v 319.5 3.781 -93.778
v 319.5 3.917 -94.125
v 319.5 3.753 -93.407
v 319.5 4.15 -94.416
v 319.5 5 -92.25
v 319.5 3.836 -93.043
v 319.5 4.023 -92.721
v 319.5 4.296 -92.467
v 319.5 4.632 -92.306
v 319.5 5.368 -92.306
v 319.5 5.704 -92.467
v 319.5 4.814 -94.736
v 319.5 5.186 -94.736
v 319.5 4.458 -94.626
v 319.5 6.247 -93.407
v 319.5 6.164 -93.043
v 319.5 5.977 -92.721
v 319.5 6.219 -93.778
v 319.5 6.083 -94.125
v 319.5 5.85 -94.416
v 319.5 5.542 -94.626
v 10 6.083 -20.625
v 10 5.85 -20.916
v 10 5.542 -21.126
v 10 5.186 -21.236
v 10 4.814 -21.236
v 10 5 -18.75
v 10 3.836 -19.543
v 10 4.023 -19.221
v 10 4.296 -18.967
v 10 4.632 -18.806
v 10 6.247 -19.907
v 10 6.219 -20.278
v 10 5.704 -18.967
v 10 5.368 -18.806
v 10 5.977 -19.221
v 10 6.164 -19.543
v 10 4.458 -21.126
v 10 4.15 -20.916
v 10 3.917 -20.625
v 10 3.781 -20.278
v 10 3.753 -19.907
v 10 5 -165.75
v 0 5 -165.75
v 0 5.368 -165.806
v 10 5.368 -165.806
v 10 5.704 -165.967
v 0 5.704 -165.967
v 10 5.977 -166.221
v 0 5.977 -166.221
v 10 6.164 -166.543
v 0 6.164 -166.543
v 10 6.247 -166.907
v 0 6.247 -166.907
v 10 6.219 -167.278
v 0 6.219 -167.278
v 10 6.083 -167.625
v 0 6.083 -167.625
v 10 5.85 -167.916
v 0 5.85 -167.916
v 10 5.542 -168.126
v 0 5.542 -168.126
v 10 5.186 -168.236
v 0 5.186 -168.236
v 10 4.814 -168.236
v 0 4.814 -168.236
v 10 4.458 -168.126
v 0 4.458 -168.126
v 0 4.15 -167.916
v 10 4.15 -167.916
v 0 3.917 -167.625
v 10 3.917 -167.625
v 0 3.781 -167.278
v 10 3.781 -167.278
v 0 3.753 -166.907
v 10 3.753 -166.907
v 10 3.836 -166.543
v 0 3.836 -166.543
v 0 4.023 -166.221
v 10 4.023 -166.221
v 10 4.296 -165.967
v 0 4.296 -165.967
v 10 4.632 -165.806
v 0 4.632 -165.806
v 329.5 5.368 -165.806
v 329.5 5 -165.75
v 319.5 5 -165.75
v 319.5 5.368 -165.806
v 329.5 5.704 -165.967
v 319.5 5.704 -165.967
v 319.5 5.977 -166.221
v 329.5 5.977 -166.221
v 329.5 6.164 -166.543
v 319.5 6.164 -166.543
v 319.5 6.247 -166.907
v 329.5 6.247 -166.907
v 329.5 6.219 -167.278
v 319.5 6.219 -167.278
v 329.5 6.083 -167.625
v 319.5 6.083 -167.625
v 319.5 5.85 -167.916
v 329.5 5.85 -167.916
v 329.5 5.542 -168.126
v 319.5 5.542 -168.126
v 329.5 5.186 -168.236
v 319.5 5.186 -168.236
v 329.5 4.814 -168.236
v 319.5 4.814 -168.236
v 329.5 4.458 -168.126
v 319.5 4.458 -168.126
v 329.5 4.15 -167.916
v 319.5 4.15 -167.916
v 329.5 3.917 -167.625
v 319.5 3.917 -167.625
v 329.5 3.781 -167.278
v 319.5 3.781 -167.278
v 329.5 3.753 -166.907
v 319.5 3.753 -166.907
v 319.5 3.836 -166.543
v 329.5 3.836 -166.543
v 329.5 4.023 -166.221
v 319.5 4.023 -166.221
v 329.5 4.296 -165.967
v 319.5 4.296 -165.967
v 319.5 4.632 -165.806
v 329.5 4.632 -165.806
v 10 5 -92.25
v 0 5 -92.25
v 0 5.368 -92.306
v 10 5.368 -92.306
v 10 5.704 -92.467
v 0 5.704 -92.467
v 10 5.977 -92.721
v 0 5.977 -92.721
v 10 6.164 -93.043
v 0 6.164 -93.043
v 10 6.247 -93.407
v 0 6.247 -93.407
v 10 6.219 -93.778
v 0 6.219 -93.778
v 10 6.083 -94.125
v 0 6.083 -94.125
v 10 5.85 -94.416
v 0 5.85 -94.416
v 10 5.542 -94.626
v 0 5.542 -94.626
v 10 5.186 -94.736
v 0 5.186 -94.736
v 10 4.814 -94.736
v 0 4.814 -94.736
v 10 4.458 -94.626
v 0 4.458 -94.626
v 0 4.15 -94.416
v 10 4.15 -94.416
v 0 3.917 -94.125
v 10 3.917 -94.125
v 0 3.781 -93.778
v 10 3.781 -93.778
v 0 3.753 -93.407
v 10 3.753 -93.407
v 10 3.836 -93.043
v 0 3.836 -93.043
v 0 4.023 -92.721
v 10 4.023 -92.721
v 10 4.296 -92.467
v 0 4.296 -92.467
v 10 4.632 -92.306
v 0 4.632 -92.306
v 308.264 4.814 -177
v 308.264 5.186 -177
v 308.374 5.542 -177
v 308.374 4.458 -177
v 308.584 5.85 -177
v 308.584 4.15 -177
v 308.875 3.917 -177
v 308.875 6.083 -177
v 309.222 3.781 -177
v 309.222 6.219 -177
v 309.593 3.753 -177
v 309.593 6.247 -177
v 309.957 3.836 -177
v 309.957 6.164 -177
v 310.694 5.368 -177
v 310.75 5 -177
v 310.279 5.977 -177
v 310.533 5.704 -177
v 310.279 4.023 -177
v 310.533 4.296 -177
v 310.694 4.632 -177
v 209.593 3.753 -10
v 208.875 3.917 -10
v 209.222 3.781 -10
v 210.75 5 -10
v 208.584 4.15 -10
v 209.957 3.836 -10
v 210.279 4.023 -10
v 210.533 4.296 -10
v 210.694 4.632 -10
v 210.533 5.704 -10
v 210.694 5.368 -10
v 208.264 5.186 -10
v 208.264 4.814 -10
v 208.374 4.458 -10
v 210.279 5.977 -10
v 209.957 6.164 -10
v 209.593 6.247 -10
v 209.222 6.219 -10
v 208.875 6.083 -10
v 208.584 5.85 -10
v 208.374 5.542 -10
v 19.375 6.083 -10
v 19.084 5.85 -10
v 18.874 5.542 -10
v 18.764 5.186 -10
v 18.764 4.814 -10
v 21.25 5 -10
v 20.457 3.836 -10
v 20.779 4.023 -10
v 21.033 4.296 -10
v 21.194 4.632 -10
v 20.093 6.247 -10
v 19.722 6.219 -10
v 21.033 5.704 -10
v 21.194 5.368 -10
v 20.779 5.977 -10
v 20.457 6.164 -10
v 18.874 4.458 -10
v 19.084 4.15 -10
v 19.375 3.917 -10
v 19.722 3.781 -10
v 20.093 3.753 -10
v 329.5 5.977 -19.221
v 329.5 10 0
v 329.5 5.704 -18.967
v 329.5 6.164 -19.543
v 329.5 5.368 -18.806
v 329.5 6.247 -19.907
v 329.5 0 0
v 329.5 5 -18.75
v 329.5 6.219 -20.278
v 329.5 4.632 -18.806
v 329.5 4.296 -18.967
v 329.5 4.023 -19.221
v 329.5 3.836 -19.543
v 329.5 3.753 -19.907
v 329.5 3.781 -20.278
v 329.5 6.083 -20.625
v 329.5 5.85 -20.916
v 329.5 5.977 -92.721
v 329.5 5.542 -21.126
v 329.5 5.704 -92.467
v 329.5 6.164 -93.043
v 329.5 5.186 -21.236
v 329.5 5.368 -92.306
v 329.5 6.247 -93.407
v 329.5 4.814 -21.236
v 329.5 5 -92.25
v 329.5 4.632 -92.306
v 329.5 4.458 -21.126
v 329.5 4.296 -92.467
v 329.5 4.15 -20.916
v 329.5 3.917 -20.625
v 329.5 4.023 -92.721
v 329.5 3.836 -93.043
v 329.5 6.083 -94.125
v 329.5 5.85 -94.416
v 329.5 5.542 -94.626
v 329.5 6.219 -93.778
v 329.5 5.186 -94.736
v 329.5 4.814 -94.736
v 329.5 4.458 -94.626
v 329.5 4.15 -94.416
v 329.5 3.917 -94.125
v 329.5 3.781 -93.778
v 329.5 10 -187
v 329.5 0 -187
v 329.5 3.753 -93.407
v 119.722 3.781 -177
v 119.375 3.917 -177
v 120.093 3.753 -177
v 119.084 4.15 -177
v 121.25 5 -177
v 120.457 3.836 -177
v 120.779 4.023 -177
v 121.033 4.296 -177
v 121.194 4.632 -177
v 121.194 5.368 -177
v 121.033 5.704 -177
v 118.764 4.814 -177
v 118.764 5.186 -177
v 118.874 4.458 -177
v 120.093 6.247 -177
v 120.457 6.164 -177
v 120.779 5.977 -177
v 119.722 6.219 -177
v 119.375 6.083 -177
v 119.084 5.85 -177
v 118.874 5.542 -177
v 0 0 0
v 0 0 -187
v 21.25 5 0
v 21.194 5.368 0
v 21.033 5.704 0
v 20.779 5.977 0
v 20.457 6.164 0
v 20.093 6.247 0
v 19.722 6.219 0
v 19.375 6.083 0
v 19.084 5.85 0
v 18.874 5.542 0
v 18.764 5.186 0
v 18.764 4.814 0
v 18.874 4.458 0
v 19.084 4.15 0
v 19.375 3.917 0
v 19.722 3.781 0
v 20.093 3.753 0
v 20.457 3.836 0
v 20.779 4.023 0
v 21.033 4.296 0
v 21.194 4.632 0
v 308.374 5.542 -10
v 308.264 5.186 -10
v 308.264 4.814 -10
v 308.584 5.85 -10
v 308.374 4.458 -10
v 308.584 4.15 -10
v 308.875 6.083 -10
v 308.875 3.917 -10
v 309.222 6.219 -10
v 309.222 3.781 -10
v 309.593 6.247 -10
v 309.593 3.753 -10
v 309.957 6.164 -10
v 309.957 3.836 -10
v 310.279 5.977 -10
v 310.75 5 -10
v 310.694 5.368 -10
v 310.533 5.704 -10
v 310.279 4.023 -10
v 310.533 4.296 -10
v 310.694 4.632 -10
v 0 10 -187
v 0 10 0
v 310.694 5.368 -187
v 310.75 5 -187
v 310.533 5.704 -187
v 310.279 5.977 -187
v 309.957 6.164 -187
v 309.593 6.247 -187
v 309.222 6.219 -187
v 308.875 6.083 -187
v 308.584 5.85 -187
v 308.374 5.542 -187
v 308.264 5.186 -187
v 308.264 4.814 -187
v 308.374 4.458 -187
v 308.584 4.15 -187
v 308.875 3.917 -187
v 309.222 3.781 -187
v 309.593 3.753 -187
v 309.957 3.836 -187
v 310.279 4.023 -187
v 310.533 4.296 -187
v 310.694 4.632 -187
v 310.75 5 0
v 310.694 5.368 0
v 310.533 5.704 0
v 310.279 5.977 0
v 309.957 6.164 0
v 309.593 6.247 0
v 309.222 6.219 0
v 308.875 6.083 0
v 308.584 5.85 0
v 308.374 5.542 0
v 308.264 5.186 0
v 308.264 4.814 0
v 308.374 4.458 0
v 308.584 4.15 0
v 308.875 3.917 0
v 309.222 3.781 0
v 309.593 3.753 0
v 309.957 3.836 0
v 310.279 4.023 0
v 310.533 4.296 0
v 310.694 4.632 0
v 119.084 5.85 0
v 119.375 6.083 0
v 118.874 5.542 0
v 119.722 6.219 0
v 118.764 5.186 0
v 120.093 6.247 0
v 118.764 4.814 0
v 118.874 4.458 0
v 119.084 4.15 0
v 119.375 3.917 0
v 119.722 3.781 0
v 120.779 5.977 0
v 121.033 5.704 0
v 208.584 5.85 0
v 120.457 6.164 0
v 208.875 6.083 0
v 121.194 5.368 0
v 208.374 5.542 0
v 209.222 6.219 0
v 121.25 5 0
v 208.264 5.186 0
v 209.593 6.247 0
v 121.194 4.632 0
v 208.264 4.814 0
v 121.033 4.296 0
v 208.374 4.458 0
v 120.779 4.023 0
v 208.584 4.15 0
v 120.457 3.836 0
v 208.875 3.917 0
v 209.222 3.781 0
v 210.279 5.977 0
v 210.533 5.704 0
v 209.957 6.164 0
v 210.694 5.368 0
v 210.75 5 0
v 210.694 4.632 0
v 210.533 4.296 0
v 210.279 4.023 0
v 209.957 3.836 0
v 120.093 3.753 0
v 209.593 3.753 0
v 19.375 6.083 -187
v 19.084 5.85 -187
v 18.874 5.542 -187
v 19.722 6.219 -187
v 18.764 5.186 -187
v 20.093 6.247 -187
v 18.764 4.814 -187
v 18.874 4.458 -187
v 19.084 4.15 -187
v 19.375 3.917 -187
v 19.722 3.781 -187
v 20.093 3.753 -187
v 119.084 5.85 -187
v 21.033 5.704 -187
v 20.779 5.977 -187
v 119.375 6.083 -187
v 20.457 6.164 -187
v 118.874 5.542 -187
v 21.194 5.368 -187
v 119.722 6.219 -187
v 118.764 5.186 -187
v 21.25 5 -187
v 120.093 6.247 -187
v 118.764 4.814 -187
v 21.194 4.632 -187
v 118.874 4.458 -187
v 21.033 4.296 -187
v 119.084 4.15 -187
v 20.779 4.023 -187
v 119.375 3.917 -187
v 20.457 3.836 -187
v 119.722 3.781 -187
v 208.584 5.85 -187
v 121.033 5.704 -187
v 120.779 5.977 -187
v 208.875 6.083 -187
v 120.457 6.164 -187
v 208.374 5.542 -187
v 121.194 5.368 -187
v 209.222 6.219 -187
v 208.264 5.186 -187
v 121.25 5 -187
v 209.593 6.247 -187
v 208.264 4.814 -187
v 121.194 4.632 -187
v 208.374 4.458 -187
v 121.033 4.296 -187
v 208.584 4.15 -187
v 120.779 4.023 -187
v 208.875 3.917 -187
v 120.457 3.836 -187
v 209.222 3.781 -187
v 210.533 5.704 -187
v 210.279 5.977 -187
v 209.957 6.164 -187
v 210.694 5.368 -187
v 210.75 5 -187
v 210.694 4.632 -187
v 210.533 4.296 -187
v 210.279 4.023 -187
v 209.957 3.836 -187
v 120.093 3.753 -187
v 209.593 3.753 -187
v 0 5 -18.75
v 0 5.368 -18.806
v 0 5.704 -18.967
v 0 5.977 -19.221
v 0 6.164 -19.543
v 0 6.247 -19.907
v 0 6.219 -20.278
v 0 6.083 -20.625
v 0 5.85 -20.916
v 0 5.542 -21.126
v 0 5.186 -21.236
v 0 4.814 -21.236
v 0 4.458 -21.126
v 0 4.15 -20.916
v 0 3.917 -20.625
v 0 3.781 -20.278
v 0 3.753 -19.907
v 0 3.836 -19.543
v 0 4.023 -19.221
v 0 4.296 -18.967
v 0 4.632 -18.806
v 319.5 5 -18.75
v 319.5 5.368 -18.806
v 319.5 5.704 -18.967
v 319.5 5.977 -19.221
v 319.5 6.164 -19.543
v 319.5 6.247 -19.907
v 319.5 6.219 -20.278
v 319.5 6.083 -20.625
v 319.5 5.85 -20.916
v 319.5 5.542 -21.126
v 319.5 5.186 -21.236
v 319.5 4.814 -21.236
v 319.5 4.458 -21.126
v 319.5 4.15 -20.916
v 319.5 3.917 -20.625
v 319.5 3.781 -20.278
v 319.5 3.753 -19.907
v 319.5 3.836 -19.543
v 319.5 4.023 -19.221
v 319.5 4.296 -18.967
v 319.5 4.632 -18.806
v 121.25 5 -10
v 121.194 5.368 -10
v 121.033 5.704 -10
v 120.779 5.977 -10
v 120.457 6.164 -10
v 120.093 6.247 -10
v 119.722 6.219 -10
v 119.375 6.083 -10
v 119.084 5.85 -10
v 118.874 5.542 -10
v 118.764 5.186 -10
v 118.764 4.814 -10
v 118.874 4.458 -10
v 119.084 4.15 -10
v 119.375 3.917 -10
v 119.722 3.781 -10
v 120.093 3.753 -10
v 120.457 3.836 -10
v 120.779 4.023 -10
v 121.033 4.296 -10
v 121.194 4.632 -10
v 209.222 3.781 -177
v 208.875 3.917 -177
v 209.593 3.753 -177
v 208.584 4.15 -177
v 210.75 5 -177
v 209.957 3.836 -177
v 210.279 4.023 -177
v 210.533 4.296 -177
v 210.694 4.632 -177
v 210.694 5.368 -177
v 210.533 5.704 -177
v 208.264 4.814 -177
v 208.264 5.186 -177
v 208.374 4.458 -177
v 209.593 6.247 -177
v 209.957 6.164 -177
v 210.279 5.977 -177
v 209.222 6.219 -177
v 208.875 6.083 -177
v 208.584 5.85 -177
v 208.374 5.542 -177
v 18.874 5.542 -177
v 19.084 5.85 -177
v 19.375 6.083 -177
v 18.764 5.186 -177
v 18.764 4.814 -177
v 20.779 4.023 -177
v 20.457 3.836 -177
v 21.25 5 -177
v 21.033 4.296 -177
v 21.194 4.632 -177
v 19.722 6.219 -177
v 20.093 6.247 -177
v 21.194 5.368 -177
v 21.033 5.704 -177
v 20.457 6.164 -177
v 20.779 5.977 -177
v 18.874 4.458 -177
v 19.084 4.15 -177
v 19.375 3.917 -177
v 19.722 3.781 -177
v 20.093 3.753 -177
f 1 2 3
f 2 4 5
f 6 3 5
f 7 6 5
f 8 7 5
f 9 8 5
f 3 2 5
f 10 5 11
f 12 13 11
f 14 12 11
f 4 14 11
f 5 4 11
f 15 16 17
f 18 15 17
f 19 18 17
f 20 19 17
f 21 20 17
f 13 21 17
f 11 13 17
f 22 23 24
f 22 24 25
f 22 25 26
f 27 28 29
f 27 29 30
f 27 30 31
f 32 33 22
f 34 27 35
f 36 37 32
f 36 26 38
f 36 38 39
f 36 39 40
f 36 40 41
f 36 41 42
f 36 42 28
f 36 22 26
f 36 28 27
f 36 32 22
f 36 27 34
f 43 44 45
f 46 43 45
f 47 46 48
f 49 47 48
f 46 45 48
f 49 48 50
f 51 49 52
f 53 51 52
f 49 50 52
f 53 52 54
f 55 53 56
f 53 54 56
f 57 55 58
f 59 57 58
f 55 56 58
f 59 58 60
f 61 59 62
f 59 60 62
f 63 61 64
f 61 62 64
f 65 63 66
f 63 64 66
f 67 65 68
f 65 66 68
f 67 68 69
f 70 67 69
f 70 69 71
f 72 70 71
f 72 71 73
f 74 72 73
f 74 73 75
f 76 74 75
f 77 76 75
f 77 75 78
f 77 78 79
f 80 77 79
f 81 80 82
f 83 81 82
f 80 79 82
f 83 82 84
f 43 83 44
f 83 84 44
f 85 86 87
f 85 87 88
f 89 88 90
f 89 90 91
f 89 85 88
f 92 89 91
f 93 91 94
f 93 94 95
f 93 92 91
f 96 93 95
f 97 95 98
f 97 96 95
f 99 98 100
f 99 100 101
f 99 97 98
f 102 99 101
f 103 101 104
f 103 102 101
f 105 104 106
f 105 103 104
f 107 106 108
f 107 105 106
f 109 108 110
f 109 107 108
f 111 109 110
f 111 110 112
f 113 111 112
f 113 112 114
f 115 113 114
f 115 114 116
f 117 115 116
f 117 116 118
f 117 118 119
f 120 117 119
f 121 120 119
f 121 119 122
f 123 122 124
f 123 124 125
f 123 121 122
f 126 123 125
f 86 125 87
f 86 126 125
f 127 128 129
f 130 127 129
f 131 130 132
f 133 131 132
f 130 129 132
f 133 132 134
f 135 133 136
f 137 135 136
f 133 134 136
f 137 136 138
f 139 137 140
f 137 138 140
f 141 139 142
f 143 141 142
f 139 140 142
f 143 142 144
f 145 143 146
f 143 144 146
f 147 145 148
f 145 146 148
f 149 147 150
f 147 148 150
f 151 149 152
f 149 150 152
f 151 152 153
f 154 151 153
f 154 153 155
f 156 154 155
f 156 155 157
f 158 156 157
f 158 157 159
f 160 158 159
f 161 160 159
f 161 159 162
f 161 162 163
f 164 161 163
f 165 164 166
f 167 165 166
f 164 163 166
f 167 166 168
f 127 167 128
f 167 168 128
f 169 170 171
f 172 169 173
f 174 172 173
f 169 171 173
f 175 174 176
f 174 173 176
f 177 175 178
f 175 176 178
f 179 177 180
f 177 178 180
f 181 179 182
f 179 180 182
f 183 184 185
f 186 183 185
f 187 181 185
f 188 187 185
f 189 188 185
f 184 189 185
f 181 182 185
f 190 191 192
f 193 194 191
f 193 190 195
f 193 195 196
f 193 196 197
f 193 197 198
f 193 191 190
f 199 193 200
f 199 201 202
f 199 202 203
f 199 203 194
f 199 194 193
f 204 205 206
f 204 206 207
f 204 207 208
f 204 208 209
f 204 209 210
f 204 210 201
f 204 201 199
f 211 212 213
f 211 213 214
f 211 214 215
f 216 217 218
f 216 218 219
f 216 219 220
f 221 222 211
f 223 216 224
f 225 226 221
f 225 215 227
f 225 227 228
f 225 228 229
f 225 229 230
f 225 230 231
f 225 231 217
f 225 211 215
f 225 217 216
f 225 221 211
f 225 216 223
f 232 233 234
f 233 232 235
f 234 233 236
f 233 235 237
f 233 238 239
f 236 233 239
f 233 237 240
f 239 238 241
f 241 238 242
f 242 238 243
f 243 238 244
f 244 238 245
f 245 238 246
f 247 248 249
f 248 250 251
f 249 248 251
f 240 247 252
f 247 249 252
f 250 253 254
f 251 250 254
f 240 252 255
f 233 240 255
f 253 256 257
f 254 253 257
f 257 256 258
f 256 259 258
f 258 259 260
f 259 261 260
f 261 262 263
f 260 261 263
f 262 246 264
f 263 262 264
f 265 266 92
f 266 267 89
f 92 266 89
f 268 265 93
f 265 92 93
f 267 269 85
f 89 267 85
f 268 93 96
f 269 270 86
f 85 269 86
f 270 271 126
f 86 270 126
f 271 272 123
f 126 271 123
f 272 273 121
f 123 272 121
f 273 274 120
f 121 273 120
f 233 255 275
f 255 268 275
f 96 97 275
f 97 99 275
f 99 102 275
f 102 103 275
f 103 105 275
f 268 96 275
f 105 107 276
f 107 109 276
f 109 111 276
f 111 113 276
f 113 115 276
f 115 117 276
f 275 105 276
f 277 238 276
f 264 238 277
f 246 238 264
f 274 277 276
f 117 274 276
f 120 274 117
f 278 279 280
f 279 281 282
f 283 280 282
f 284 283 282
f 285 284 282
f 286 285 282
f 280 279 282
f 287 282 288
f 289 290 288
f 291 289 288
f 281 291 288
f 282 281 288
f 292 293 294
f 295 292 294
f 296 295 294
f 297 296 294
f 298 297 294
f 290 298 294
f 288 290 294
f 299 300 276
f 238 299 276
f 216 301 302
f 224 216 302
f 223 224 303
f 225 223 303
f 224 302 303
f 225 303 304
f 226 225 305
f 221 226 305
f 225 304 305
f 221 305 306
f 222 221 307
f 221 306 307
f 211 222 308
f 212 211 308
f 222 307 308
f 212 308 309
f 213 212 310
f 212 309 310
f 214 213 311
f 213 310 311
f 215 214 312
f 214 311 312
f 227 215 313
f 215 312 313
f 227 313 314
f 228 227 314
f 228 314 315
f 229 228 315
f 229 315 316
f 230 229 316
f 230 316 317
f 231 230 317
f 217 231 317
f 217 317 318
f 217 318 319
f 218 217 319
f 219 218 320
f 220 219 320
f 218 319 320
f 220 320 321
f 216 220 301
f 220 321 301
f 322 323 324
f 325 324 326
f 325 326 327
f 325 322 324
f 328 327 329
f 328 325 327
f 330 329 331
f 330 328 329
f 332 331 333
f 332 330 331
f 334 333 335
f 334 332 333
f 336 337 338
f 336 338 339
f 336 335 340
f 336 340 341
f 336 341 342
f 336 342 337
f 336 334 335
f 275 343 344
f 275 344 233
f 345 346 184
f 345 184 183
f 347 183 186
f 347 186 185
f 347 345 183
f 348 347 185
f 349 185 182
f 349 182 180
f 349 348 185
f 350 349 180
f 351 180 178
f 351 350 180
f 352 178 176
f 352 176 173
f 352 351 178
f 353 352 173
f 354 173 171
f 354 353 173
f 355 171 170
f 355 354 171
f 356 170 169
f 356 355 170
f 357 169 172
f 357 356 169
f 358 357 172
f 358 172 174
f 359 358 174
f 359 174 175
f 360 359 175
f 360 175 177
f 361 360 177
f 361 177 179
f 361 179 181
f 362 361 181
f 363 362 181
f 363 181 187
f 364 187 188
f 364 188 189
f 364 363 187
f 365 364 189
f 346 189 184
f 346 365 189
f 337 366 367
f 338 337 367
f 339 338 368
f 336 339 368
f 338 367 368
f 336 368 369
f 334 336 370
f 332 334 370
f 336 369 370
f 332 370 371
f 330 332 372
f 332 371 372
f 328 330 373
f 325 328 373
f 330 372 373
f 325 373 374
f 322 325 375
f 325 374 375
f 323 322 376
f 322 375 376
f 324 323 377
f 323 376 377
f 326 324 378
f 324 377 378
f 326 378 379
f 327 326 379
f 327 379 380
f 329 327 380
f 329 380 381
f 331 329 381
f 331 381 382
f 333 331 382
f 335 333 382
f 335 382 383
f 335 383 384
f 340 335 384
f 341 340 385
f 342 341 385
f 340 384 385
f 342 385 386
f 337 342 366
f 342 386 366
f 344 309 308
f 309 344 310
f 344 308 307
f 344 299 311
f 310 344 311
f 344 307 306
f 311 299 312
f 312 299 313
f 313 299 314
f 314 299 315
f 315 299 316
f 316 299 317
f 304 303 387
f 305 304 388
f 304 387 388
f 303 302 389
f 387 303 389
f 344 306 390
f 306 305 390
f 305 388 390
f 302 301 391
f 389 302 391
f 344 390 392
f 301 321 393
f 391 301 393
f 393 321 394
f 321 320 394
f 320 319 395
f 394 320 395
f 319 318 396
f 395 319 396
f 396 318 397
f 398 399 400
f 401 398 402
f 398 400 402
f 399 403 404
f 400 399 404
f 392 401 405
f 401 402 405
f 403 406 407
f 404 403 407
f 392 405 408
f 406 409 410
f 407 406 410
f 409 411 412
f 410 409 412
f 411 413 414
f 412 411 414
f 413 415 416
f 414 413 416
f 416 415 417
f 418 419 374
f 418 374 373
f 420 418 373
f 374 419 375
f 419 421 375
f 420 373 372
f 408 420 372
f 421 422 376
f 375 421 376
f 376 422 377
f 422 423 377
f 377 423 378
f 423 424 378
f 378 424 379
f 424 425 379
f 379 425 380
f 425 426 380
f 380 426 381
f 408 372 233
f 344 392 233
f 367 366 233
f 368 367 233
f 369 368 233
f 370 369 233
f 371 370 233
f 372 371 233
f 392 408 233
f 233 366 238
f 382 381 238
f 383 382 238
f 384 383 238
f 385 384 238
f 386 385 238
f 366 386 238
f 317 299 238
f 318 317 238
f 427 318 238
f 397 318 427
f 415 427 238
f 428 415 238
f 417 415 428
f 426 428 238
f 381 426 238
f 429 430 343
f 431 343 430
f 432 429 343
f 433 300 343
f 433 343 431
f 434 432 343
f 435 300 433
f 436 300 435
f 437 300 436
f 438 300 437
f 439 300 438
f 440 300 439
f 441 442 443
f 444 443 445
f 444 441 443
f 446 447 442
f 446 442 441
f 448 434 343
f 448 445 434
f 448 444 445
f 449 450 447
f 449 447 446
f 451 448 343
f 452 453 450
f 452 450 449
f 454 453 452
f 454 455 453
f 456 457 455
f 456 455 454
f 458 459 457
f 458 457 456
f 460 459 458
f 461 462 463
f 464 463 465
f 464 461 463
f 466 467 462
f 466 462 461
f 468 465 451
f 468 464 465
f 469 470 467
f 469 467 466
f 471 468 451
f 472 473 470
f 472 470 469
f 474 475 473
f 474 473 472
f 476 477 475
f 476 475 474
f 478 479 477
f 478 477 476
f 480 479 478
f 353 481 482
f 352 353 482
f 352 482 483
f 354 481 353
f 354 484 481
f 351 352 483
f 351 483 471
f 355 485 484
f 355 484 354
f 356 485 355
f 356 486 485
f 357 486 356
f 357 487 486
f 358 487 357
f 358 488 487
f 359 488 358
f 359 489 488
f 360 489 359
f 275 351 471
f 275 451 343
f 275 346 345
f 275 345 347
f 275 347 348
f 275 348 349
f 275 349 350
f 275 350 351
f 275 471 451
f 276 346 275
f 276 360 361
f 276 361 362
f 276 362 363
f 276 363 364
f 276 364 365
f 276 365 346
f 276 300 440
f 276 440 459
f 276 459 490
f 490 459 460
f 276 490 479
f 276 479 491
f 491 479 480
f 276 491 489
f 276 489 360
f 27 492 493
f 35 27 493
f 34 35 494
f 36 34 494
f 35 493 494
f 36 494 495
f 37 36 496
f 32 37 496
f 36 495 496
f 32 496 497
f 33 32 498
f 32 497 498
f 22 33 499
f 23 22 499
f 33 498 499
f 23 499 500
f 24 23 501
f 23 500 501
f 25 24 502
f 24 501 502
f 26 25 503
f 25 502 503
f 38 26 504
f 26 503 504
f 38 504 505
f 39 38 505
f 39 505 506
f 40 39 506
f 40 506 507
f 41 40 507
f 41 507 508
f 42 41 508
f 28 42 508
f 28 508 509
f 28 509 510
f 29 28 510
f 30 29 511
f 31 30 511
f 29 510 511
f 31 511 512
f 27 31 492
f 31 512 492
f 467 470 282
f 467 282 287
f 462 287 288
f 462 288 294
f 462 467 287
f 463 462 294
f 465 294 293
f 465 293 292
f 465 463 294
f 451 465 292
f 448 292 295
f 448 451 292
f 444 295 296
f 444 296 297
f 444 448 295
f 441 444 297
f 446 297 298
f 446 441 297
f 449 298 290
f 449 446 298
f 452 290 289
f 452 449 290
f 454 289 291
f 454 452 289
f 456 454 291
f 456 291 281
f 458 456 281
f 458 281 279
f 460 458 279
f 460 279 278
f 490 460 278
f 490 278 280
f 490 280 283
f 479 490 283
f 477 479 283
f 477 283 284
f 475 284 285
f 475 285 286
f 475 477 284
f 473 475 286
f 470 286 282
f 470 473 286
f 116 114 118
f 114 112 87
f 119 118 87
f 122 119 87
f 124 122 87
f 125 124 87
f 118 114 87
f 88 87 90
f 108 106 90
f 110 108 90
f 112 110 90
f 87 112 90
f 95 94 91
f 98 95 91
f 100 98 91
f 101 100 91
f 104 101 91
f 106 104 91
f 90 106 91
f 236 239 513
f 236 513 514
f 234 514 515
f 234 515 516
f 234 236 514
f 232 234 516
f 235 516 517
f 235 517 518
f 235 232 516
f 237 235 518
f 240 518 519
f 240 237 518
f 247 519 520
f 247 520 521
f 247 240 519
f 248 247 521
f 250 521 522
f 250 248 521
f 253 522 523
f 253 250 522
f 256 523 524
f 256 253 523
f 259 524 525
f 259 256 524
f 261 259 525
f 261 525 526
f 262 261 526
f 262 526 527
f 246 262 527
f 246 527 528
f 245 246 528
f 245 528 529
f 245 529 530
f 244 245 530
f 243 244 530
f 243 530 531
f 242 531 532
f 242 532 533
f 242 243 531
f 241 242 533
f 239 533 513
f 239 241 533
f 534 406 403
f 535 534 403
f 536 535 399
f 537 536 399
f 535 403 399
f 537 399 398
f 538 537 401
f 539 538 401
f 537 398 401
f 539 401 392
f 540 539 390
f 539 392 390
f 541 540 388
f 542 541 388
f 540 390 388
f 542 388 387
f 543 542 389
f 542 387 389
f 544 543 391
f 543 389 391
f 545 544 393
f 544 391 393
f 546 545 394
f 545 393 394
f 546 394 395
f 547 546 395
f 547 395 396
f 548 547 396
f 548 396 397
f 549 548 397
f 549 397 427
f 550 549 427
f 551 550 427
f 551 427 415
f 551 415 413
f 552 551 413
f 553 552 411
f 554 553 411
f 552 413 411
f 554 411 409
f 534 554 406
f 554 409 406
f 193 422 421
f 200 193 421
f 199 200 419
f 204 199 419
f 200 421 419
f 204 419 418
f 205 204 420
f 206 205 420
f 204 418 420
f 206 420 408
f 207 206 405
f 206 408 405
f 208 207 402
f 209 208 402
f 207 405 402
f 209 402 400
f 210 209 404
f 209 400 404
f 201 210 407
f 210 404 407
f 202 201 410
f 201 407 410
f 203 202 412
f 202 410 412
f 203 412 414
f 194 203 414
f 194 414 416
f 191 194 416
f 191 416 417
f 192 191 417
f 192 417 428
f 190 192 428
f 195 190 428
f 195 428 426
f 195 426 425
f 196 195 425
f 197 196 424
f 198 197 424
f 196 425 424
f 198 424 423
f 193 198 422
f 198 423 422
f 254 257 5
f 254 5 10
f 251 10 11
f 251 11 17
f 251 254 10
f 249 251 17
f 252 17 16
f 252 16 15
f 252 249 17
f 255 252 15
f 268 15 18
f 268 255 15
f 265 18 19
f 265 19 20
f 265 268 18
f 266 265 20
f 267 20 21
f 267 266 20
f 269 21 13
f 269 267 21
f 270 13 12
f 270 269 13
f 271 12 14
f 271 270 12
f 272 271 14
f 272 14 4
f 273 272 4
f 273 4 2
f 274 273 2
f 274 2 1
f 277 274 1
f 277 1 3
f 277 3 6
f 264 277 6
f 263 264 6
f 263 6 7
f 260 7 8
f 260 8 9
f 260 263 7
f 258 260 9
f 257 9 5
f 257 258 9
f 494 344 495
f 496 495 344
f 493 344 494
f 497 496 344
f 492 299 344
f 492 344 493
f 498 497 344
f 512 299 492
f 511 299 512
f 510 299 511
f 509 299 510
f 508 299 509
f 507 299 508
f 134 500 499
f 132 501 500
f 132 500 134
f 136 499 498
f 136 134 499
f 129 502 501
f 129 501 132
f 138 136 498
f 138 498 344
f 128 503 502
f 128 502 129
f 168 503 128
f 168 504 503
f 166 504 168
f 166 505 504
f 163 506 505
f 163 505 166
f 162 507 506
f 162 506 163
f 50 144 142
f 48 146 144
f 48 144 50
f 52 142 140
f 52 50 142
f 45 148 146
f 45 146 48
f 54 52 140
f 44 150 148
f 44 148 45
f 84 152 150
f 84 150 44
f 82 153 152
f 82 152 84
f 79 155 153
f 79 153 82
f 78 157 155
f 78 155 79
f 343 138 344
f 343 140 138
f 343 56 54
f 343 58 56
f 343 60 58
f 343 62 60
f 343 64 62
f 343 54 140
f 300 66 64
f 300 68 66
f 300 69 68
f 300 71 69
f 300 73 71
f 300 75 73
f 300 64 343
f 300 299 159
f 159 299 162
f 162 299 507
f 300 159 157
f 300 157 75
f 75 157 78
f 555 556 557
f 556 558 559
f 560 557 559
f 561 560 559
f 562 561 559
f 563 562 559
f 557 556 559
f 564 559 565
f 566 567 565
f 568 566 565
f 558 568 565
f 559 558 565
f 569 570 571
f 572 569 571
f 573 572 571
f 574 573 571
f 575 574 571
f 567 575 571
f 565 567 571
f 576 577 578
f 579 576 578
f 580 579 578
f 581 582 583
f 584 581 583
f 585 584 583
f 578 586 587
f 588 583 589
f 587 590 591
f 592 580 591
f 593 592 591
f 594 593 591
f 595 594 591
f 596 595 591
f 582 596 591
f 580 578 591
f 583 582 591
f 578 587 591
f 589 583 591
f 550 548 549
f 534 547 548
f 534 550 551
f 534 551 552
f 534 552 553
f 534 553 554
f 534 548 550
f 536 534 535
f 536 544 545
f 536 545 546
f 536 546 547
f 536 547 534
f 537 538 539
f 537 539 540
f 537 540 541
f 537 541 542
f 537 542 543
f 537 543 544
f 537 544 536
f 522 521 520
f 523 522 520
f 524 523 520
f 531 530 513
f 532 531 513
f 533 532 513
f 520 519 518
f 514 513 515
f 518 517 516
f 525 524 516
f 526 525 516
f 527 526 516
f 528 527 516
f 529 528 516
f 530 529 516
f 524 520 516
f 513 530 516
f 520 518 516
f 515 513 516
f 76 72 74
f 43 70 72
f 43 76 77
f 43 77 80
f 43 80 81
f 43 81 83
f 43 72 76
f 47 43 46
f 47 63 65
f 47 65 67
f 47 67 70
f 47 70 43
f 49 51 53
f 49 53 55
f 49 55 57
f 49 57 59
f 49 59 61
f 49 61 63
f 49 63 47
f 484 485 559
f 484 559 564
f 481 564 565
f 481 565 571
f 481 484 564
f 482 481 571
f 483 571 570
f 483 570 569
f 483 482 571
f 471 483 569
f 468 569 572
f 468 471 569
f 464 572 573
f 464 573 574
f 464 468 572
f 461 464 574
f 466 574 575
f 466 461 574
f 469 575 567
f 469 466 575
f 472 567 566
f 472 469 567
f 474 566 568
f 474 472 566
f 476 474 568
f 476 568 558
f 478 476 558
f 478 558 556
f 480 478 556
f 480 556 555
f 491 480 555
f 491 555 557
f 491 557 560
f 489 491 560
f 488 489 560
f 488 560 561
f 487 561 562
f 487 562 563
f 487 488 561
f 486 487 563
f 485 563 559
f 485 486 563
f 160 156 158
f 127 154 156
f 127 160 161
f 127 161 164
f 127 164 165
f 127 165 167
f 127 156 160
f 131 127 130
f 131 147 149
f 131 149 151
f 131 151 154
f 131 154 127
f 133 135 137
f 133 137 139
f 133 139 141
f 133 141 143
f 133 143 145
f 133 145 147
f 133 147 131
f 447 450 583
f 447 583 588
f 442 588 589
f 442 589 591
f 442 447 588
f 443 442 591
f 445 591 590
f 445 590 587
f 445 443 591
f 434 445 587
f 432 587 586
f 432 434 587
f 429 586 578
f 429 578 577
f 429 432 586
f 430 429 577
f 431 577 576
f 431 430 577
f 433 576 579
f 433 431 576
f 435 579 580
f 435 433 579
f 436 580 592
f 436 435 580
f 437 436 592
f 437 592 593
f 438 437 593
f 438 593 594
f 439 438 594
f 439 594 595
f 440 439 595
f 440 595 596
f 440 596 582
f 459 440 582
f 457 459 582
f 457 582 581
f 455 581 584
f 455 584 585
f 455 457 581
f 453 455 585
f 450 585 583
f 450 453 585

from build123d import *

# Parameters (mm, degrees)
SKETCH1_W           = 329.5
SKETCH1_H           = 187
BOSS_EXTRUDE1_DEPTH = 10
SKETCH2_R           = 1.25
CUT_EXTRUDE1_DEPTH  = 10
CUT_EXTRUDE2_START  = -187
SKETCH2_2_R         = 1.25
CUT_EXTRUDE2_DEPTH  = 10
SKETCH3_R           = 1.25
CUT_EXTRUDE3_DEPTH  = 10
CUT_EXTRUDE4_START  = -329.5
SKETCH3_2_R         = 1.25
CUT_EXTRUDE4_DEPTH  = 10


with BuildPart() as part:
    # Sketch1 → Boss-Extrude1 (new body)
    with BuildSketch(Plane(origin=(0, 0, 0), x_dir=(1, 0, 0), z_dir=(0, 1, 0))):
        with Locations((164.75, 93.5)):
            Rectangle(SKETCH1_W, SKETCH1_H)
    extrude(amount=BOSS_EXTRUDE1_DEPTH)

    # Sketch2 → Cut-Extrude1 (cut)
    with BuildSketch(Plane.XY):
        with Locations((20, 5)):
            Circle(SKETCH2_R)
        with Locations((120, 5)):
            Circle(SKETCH2_R)
        with Locations((209.5, 5)):
            Circle(SKETCH2_R)
        with Locations((309.5, 5)):
            Circle(SKETCH2_R)
    extrude(amount=-CUT_EXTRUDE1_DEPTH, mode=Mode.SUBTRACT)

    # Sketch2<2> → Cut-Extrude2 (cut)
    with BuildSketch(Plane.XY.offset(CUT_EXTRUDE2_START)):
        with Locations((20, 5)):
            Circle(SKETCH2_2_R)
        with Locations((120, 5)):
            Circle(SKETCH2_2_R)
        with Locations((209.5, 5)):
            Circle(SKETCH2_2_R)
        with Locations((309.5, 5)):
            Circle(SKETCH2_2_R)
    extrude(amount=CUT_EXTRUDE2_DEPTH, mode=Mode.SUBTRACT)

    # Sketch3 → Cut-Extrude3 (cut)
    with BuildSketch(Plane.ZY):
        with Locations((-167, 5)):
            Circle(SKETCH3_R)
        with Locations((-93.5, 5)):
            Circle(SKETCH3_R)
        with Locations((-20, 5)):
            Circle(SKETCH3_R)
    extrude(amount=-CUT_EXTRUDE3_DEPTH, mode=Mode.SUBTRACT)

    # Sketch3<2> → Cut-Extrude4 (cut)
    with BuildSketch(Plane.ZY.offset(CUT_EXTRUDE4_START)):
        with Locations((-167, 5)):
            Circle(SKETCH3_2_R)
        with Locations((-93.5, 5)):
            Circle(SKETCH3_2_R)
        with Locations((-20, 5)):
            Circle(SKETCH3_2_R)
    extrude(amount=CUT_EXTRUDE4_DEPTH, mode=Mode.SUBTRACT)


solid = part.part
